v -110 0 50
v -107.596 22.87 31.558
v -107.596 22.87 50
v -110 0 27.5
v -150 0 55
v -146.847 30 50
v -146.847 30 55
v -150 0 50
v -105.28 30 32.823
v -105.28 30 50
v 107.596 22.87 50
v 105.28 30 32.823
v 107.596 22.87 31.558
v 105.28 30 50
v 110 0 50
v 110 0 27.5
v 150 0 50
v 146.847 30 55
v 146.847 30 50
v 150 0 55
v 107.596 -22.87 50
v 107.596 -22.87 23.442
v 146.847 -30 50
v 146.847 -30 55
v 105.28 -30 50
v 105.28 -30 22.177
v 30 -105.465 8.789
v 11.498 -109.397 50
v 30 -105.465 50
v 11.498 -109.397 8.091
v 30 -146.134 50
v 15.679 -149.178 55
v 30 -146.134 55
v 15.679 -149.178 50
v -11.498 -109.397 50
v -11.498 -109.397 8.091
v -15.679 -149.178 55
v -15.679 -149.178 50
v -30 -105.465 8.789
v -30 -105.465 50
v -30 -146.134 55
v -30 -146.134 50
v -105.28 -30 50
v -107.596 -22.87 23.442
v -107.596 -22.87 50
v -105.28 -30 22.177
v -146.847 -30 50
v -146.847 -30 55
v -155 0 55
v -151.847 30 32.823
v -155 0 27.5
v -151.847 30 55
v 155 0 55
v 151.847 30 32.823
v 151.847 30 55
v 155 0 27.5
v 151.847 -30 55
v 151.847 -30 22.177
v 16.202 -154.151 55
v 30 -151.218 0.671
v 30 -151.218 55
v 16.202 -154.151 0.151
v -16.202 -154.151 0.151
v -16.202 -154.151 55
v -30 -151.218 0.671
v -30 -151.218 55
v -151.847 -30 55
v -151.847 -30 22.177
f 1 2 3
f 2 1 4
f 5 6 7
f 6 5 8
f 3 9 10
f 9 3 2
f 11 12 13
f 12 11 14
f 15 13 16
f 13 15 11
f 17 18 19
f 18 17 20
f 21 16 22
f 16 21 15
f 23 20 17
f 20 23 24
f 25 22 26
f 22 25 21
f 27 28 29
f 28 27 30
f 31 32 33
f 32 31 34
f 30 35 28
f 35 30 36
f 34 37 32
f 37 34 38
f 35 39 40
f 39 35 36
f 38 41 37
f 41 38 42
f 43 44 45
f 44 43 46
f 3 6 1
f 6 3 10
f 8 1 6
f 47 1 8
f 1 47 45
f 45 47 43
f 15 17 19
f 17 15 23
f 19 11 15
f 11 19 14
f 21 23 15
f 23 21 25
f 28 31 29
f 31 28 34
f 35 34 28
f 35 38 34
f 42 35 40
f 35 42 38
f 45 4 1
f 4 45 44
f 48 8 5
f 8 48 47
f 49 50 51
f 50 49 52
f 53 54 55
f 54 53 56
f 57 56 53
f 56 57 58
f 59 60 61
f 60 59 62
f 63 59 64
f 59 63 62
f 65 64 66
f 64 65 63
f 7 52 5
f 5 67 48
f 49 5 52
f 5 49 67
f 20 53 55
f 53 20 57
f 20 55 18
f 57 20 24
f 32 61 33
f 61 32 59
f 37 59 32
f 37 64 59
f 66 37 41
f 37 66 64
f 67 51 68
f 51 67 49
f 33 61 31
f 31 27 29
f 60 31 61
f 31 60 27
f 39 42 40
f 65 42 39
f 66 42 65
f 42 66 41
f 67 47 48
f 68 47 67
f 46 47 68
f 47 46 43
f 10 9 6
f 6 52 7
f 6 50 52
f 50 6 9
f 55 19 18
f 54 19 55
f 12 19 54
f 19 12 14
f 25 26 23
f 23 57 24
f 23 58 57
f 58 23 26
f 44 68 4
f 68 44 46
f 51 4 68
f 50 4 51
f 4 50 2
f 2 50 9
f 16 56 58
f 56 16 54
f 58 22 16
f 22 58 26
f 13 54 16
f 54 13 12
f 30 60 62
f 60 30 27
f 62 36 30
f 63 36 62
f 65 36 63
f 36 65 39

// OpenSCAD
/** Create Wedge **/
/*      
Universal Adjustabel Wedge by Chris Schaefer is licensed under the Creative Commons - Attribution - Non-Commercial license. 
*/

// MB Interface

/* [Gap] */
// Bottom Pot Diameter
Diameter=300;
// how high is the gap? equals the wedge hight
Gap_Height=50;

/* [Wedge Size] */
// how wide is the wedge?
Wedge_Width=60;
// Depth of the wedge, going under the pot
Wedge_Depth=40;

// Should the wedge have edges to prevent rolling off?
/* [Edge] */
// the width will be added around the wedge
Edge_Width=5.0;
// the hight will be added to the gap size.
Edge_Height=5.0;


// Interface End
/* [Hidden] */
// Length
LEN=Diameter; 
// Gap 
GAP=Gap_Height;

// Block size
/* [Block Size] */
// width (width at the max hight)
X=Wedge_Width;
// length (length along the slope)      
Y=Wedge_Depth;

// edge around the block to stop rolling off
EDGE=Edge_Width;    // edge border thickness
EDGE_H=Edge_Height;  // hight of the edge

// ========================================================
// Block is:
module block () {
    // Block size
    cube(size = [ X, Y, GAP ], center = false);
    // Edge added
    translate([-EDGE, -EDGE, 0])
        difference ()
          {
            cube(size = [ X+2*EDGE, Y+2*EDGE, GAP+EDGE_H ], center = false);
            translate ([EDGE, EDGE,0])
              cube(size = [ X, Y, GAP+EDGE_H ], center = false);
          }
      }

module Circ () {
    color("red")
    rotate_extrude()
        translate([LEN/2-Y, 0])
           polygon( points=[[0,0],[0,GAP],[Y,GAP],[Y,0]]  );   
    color("blue")
    rotate_extrude()
        translate([LEN/2, 0])
           polygon( points=[[0,0],[0,GAP+EDGE_H],[EDGE,GAP+EDGE_H],[EDGE,0]]  );
}
module CircBlock () {
   color ("blue")
    rotate ([0,0,180]) 
        translate([-X/2, 0, 0]) cube(size = [ X, LEN/2+EDGE, GAP+EDGE_H ], center = false);
    rotate ([0,0,90]) 
        translate([-X/2, 0, 0]) cube(size = [ X, LEN/2+EDGE, GAP+EDGE_H ], center = false);
   rotate ([0,0,-90]) 
        translate([-X/2, 0, 0]) cube(size = [ X, LEN/2+EDGE, GAP+EDGE_H ], center = false);
}

module wedge () {
    // Wedge with the right slop
        // shift and rotate it into place
            translate ( [-LEN/2-EDGE,-LEN/2,GAP] )
            rotate ([0,90,0])
        // wedge
        linear_extrude(height = LEN+2*EDGE)
         polygon( points=[[-EDGE_H,-EDGE],[-EDGE_H,LEN+EDGE],[GAP,-EDGE]]  );
    
 }
 
// limit the block to the wedge, gives it the right slope.
intersection () 
 {
      Circ (); 
      CircBlock ();
     // block ();
     wedge ();
  }
  
